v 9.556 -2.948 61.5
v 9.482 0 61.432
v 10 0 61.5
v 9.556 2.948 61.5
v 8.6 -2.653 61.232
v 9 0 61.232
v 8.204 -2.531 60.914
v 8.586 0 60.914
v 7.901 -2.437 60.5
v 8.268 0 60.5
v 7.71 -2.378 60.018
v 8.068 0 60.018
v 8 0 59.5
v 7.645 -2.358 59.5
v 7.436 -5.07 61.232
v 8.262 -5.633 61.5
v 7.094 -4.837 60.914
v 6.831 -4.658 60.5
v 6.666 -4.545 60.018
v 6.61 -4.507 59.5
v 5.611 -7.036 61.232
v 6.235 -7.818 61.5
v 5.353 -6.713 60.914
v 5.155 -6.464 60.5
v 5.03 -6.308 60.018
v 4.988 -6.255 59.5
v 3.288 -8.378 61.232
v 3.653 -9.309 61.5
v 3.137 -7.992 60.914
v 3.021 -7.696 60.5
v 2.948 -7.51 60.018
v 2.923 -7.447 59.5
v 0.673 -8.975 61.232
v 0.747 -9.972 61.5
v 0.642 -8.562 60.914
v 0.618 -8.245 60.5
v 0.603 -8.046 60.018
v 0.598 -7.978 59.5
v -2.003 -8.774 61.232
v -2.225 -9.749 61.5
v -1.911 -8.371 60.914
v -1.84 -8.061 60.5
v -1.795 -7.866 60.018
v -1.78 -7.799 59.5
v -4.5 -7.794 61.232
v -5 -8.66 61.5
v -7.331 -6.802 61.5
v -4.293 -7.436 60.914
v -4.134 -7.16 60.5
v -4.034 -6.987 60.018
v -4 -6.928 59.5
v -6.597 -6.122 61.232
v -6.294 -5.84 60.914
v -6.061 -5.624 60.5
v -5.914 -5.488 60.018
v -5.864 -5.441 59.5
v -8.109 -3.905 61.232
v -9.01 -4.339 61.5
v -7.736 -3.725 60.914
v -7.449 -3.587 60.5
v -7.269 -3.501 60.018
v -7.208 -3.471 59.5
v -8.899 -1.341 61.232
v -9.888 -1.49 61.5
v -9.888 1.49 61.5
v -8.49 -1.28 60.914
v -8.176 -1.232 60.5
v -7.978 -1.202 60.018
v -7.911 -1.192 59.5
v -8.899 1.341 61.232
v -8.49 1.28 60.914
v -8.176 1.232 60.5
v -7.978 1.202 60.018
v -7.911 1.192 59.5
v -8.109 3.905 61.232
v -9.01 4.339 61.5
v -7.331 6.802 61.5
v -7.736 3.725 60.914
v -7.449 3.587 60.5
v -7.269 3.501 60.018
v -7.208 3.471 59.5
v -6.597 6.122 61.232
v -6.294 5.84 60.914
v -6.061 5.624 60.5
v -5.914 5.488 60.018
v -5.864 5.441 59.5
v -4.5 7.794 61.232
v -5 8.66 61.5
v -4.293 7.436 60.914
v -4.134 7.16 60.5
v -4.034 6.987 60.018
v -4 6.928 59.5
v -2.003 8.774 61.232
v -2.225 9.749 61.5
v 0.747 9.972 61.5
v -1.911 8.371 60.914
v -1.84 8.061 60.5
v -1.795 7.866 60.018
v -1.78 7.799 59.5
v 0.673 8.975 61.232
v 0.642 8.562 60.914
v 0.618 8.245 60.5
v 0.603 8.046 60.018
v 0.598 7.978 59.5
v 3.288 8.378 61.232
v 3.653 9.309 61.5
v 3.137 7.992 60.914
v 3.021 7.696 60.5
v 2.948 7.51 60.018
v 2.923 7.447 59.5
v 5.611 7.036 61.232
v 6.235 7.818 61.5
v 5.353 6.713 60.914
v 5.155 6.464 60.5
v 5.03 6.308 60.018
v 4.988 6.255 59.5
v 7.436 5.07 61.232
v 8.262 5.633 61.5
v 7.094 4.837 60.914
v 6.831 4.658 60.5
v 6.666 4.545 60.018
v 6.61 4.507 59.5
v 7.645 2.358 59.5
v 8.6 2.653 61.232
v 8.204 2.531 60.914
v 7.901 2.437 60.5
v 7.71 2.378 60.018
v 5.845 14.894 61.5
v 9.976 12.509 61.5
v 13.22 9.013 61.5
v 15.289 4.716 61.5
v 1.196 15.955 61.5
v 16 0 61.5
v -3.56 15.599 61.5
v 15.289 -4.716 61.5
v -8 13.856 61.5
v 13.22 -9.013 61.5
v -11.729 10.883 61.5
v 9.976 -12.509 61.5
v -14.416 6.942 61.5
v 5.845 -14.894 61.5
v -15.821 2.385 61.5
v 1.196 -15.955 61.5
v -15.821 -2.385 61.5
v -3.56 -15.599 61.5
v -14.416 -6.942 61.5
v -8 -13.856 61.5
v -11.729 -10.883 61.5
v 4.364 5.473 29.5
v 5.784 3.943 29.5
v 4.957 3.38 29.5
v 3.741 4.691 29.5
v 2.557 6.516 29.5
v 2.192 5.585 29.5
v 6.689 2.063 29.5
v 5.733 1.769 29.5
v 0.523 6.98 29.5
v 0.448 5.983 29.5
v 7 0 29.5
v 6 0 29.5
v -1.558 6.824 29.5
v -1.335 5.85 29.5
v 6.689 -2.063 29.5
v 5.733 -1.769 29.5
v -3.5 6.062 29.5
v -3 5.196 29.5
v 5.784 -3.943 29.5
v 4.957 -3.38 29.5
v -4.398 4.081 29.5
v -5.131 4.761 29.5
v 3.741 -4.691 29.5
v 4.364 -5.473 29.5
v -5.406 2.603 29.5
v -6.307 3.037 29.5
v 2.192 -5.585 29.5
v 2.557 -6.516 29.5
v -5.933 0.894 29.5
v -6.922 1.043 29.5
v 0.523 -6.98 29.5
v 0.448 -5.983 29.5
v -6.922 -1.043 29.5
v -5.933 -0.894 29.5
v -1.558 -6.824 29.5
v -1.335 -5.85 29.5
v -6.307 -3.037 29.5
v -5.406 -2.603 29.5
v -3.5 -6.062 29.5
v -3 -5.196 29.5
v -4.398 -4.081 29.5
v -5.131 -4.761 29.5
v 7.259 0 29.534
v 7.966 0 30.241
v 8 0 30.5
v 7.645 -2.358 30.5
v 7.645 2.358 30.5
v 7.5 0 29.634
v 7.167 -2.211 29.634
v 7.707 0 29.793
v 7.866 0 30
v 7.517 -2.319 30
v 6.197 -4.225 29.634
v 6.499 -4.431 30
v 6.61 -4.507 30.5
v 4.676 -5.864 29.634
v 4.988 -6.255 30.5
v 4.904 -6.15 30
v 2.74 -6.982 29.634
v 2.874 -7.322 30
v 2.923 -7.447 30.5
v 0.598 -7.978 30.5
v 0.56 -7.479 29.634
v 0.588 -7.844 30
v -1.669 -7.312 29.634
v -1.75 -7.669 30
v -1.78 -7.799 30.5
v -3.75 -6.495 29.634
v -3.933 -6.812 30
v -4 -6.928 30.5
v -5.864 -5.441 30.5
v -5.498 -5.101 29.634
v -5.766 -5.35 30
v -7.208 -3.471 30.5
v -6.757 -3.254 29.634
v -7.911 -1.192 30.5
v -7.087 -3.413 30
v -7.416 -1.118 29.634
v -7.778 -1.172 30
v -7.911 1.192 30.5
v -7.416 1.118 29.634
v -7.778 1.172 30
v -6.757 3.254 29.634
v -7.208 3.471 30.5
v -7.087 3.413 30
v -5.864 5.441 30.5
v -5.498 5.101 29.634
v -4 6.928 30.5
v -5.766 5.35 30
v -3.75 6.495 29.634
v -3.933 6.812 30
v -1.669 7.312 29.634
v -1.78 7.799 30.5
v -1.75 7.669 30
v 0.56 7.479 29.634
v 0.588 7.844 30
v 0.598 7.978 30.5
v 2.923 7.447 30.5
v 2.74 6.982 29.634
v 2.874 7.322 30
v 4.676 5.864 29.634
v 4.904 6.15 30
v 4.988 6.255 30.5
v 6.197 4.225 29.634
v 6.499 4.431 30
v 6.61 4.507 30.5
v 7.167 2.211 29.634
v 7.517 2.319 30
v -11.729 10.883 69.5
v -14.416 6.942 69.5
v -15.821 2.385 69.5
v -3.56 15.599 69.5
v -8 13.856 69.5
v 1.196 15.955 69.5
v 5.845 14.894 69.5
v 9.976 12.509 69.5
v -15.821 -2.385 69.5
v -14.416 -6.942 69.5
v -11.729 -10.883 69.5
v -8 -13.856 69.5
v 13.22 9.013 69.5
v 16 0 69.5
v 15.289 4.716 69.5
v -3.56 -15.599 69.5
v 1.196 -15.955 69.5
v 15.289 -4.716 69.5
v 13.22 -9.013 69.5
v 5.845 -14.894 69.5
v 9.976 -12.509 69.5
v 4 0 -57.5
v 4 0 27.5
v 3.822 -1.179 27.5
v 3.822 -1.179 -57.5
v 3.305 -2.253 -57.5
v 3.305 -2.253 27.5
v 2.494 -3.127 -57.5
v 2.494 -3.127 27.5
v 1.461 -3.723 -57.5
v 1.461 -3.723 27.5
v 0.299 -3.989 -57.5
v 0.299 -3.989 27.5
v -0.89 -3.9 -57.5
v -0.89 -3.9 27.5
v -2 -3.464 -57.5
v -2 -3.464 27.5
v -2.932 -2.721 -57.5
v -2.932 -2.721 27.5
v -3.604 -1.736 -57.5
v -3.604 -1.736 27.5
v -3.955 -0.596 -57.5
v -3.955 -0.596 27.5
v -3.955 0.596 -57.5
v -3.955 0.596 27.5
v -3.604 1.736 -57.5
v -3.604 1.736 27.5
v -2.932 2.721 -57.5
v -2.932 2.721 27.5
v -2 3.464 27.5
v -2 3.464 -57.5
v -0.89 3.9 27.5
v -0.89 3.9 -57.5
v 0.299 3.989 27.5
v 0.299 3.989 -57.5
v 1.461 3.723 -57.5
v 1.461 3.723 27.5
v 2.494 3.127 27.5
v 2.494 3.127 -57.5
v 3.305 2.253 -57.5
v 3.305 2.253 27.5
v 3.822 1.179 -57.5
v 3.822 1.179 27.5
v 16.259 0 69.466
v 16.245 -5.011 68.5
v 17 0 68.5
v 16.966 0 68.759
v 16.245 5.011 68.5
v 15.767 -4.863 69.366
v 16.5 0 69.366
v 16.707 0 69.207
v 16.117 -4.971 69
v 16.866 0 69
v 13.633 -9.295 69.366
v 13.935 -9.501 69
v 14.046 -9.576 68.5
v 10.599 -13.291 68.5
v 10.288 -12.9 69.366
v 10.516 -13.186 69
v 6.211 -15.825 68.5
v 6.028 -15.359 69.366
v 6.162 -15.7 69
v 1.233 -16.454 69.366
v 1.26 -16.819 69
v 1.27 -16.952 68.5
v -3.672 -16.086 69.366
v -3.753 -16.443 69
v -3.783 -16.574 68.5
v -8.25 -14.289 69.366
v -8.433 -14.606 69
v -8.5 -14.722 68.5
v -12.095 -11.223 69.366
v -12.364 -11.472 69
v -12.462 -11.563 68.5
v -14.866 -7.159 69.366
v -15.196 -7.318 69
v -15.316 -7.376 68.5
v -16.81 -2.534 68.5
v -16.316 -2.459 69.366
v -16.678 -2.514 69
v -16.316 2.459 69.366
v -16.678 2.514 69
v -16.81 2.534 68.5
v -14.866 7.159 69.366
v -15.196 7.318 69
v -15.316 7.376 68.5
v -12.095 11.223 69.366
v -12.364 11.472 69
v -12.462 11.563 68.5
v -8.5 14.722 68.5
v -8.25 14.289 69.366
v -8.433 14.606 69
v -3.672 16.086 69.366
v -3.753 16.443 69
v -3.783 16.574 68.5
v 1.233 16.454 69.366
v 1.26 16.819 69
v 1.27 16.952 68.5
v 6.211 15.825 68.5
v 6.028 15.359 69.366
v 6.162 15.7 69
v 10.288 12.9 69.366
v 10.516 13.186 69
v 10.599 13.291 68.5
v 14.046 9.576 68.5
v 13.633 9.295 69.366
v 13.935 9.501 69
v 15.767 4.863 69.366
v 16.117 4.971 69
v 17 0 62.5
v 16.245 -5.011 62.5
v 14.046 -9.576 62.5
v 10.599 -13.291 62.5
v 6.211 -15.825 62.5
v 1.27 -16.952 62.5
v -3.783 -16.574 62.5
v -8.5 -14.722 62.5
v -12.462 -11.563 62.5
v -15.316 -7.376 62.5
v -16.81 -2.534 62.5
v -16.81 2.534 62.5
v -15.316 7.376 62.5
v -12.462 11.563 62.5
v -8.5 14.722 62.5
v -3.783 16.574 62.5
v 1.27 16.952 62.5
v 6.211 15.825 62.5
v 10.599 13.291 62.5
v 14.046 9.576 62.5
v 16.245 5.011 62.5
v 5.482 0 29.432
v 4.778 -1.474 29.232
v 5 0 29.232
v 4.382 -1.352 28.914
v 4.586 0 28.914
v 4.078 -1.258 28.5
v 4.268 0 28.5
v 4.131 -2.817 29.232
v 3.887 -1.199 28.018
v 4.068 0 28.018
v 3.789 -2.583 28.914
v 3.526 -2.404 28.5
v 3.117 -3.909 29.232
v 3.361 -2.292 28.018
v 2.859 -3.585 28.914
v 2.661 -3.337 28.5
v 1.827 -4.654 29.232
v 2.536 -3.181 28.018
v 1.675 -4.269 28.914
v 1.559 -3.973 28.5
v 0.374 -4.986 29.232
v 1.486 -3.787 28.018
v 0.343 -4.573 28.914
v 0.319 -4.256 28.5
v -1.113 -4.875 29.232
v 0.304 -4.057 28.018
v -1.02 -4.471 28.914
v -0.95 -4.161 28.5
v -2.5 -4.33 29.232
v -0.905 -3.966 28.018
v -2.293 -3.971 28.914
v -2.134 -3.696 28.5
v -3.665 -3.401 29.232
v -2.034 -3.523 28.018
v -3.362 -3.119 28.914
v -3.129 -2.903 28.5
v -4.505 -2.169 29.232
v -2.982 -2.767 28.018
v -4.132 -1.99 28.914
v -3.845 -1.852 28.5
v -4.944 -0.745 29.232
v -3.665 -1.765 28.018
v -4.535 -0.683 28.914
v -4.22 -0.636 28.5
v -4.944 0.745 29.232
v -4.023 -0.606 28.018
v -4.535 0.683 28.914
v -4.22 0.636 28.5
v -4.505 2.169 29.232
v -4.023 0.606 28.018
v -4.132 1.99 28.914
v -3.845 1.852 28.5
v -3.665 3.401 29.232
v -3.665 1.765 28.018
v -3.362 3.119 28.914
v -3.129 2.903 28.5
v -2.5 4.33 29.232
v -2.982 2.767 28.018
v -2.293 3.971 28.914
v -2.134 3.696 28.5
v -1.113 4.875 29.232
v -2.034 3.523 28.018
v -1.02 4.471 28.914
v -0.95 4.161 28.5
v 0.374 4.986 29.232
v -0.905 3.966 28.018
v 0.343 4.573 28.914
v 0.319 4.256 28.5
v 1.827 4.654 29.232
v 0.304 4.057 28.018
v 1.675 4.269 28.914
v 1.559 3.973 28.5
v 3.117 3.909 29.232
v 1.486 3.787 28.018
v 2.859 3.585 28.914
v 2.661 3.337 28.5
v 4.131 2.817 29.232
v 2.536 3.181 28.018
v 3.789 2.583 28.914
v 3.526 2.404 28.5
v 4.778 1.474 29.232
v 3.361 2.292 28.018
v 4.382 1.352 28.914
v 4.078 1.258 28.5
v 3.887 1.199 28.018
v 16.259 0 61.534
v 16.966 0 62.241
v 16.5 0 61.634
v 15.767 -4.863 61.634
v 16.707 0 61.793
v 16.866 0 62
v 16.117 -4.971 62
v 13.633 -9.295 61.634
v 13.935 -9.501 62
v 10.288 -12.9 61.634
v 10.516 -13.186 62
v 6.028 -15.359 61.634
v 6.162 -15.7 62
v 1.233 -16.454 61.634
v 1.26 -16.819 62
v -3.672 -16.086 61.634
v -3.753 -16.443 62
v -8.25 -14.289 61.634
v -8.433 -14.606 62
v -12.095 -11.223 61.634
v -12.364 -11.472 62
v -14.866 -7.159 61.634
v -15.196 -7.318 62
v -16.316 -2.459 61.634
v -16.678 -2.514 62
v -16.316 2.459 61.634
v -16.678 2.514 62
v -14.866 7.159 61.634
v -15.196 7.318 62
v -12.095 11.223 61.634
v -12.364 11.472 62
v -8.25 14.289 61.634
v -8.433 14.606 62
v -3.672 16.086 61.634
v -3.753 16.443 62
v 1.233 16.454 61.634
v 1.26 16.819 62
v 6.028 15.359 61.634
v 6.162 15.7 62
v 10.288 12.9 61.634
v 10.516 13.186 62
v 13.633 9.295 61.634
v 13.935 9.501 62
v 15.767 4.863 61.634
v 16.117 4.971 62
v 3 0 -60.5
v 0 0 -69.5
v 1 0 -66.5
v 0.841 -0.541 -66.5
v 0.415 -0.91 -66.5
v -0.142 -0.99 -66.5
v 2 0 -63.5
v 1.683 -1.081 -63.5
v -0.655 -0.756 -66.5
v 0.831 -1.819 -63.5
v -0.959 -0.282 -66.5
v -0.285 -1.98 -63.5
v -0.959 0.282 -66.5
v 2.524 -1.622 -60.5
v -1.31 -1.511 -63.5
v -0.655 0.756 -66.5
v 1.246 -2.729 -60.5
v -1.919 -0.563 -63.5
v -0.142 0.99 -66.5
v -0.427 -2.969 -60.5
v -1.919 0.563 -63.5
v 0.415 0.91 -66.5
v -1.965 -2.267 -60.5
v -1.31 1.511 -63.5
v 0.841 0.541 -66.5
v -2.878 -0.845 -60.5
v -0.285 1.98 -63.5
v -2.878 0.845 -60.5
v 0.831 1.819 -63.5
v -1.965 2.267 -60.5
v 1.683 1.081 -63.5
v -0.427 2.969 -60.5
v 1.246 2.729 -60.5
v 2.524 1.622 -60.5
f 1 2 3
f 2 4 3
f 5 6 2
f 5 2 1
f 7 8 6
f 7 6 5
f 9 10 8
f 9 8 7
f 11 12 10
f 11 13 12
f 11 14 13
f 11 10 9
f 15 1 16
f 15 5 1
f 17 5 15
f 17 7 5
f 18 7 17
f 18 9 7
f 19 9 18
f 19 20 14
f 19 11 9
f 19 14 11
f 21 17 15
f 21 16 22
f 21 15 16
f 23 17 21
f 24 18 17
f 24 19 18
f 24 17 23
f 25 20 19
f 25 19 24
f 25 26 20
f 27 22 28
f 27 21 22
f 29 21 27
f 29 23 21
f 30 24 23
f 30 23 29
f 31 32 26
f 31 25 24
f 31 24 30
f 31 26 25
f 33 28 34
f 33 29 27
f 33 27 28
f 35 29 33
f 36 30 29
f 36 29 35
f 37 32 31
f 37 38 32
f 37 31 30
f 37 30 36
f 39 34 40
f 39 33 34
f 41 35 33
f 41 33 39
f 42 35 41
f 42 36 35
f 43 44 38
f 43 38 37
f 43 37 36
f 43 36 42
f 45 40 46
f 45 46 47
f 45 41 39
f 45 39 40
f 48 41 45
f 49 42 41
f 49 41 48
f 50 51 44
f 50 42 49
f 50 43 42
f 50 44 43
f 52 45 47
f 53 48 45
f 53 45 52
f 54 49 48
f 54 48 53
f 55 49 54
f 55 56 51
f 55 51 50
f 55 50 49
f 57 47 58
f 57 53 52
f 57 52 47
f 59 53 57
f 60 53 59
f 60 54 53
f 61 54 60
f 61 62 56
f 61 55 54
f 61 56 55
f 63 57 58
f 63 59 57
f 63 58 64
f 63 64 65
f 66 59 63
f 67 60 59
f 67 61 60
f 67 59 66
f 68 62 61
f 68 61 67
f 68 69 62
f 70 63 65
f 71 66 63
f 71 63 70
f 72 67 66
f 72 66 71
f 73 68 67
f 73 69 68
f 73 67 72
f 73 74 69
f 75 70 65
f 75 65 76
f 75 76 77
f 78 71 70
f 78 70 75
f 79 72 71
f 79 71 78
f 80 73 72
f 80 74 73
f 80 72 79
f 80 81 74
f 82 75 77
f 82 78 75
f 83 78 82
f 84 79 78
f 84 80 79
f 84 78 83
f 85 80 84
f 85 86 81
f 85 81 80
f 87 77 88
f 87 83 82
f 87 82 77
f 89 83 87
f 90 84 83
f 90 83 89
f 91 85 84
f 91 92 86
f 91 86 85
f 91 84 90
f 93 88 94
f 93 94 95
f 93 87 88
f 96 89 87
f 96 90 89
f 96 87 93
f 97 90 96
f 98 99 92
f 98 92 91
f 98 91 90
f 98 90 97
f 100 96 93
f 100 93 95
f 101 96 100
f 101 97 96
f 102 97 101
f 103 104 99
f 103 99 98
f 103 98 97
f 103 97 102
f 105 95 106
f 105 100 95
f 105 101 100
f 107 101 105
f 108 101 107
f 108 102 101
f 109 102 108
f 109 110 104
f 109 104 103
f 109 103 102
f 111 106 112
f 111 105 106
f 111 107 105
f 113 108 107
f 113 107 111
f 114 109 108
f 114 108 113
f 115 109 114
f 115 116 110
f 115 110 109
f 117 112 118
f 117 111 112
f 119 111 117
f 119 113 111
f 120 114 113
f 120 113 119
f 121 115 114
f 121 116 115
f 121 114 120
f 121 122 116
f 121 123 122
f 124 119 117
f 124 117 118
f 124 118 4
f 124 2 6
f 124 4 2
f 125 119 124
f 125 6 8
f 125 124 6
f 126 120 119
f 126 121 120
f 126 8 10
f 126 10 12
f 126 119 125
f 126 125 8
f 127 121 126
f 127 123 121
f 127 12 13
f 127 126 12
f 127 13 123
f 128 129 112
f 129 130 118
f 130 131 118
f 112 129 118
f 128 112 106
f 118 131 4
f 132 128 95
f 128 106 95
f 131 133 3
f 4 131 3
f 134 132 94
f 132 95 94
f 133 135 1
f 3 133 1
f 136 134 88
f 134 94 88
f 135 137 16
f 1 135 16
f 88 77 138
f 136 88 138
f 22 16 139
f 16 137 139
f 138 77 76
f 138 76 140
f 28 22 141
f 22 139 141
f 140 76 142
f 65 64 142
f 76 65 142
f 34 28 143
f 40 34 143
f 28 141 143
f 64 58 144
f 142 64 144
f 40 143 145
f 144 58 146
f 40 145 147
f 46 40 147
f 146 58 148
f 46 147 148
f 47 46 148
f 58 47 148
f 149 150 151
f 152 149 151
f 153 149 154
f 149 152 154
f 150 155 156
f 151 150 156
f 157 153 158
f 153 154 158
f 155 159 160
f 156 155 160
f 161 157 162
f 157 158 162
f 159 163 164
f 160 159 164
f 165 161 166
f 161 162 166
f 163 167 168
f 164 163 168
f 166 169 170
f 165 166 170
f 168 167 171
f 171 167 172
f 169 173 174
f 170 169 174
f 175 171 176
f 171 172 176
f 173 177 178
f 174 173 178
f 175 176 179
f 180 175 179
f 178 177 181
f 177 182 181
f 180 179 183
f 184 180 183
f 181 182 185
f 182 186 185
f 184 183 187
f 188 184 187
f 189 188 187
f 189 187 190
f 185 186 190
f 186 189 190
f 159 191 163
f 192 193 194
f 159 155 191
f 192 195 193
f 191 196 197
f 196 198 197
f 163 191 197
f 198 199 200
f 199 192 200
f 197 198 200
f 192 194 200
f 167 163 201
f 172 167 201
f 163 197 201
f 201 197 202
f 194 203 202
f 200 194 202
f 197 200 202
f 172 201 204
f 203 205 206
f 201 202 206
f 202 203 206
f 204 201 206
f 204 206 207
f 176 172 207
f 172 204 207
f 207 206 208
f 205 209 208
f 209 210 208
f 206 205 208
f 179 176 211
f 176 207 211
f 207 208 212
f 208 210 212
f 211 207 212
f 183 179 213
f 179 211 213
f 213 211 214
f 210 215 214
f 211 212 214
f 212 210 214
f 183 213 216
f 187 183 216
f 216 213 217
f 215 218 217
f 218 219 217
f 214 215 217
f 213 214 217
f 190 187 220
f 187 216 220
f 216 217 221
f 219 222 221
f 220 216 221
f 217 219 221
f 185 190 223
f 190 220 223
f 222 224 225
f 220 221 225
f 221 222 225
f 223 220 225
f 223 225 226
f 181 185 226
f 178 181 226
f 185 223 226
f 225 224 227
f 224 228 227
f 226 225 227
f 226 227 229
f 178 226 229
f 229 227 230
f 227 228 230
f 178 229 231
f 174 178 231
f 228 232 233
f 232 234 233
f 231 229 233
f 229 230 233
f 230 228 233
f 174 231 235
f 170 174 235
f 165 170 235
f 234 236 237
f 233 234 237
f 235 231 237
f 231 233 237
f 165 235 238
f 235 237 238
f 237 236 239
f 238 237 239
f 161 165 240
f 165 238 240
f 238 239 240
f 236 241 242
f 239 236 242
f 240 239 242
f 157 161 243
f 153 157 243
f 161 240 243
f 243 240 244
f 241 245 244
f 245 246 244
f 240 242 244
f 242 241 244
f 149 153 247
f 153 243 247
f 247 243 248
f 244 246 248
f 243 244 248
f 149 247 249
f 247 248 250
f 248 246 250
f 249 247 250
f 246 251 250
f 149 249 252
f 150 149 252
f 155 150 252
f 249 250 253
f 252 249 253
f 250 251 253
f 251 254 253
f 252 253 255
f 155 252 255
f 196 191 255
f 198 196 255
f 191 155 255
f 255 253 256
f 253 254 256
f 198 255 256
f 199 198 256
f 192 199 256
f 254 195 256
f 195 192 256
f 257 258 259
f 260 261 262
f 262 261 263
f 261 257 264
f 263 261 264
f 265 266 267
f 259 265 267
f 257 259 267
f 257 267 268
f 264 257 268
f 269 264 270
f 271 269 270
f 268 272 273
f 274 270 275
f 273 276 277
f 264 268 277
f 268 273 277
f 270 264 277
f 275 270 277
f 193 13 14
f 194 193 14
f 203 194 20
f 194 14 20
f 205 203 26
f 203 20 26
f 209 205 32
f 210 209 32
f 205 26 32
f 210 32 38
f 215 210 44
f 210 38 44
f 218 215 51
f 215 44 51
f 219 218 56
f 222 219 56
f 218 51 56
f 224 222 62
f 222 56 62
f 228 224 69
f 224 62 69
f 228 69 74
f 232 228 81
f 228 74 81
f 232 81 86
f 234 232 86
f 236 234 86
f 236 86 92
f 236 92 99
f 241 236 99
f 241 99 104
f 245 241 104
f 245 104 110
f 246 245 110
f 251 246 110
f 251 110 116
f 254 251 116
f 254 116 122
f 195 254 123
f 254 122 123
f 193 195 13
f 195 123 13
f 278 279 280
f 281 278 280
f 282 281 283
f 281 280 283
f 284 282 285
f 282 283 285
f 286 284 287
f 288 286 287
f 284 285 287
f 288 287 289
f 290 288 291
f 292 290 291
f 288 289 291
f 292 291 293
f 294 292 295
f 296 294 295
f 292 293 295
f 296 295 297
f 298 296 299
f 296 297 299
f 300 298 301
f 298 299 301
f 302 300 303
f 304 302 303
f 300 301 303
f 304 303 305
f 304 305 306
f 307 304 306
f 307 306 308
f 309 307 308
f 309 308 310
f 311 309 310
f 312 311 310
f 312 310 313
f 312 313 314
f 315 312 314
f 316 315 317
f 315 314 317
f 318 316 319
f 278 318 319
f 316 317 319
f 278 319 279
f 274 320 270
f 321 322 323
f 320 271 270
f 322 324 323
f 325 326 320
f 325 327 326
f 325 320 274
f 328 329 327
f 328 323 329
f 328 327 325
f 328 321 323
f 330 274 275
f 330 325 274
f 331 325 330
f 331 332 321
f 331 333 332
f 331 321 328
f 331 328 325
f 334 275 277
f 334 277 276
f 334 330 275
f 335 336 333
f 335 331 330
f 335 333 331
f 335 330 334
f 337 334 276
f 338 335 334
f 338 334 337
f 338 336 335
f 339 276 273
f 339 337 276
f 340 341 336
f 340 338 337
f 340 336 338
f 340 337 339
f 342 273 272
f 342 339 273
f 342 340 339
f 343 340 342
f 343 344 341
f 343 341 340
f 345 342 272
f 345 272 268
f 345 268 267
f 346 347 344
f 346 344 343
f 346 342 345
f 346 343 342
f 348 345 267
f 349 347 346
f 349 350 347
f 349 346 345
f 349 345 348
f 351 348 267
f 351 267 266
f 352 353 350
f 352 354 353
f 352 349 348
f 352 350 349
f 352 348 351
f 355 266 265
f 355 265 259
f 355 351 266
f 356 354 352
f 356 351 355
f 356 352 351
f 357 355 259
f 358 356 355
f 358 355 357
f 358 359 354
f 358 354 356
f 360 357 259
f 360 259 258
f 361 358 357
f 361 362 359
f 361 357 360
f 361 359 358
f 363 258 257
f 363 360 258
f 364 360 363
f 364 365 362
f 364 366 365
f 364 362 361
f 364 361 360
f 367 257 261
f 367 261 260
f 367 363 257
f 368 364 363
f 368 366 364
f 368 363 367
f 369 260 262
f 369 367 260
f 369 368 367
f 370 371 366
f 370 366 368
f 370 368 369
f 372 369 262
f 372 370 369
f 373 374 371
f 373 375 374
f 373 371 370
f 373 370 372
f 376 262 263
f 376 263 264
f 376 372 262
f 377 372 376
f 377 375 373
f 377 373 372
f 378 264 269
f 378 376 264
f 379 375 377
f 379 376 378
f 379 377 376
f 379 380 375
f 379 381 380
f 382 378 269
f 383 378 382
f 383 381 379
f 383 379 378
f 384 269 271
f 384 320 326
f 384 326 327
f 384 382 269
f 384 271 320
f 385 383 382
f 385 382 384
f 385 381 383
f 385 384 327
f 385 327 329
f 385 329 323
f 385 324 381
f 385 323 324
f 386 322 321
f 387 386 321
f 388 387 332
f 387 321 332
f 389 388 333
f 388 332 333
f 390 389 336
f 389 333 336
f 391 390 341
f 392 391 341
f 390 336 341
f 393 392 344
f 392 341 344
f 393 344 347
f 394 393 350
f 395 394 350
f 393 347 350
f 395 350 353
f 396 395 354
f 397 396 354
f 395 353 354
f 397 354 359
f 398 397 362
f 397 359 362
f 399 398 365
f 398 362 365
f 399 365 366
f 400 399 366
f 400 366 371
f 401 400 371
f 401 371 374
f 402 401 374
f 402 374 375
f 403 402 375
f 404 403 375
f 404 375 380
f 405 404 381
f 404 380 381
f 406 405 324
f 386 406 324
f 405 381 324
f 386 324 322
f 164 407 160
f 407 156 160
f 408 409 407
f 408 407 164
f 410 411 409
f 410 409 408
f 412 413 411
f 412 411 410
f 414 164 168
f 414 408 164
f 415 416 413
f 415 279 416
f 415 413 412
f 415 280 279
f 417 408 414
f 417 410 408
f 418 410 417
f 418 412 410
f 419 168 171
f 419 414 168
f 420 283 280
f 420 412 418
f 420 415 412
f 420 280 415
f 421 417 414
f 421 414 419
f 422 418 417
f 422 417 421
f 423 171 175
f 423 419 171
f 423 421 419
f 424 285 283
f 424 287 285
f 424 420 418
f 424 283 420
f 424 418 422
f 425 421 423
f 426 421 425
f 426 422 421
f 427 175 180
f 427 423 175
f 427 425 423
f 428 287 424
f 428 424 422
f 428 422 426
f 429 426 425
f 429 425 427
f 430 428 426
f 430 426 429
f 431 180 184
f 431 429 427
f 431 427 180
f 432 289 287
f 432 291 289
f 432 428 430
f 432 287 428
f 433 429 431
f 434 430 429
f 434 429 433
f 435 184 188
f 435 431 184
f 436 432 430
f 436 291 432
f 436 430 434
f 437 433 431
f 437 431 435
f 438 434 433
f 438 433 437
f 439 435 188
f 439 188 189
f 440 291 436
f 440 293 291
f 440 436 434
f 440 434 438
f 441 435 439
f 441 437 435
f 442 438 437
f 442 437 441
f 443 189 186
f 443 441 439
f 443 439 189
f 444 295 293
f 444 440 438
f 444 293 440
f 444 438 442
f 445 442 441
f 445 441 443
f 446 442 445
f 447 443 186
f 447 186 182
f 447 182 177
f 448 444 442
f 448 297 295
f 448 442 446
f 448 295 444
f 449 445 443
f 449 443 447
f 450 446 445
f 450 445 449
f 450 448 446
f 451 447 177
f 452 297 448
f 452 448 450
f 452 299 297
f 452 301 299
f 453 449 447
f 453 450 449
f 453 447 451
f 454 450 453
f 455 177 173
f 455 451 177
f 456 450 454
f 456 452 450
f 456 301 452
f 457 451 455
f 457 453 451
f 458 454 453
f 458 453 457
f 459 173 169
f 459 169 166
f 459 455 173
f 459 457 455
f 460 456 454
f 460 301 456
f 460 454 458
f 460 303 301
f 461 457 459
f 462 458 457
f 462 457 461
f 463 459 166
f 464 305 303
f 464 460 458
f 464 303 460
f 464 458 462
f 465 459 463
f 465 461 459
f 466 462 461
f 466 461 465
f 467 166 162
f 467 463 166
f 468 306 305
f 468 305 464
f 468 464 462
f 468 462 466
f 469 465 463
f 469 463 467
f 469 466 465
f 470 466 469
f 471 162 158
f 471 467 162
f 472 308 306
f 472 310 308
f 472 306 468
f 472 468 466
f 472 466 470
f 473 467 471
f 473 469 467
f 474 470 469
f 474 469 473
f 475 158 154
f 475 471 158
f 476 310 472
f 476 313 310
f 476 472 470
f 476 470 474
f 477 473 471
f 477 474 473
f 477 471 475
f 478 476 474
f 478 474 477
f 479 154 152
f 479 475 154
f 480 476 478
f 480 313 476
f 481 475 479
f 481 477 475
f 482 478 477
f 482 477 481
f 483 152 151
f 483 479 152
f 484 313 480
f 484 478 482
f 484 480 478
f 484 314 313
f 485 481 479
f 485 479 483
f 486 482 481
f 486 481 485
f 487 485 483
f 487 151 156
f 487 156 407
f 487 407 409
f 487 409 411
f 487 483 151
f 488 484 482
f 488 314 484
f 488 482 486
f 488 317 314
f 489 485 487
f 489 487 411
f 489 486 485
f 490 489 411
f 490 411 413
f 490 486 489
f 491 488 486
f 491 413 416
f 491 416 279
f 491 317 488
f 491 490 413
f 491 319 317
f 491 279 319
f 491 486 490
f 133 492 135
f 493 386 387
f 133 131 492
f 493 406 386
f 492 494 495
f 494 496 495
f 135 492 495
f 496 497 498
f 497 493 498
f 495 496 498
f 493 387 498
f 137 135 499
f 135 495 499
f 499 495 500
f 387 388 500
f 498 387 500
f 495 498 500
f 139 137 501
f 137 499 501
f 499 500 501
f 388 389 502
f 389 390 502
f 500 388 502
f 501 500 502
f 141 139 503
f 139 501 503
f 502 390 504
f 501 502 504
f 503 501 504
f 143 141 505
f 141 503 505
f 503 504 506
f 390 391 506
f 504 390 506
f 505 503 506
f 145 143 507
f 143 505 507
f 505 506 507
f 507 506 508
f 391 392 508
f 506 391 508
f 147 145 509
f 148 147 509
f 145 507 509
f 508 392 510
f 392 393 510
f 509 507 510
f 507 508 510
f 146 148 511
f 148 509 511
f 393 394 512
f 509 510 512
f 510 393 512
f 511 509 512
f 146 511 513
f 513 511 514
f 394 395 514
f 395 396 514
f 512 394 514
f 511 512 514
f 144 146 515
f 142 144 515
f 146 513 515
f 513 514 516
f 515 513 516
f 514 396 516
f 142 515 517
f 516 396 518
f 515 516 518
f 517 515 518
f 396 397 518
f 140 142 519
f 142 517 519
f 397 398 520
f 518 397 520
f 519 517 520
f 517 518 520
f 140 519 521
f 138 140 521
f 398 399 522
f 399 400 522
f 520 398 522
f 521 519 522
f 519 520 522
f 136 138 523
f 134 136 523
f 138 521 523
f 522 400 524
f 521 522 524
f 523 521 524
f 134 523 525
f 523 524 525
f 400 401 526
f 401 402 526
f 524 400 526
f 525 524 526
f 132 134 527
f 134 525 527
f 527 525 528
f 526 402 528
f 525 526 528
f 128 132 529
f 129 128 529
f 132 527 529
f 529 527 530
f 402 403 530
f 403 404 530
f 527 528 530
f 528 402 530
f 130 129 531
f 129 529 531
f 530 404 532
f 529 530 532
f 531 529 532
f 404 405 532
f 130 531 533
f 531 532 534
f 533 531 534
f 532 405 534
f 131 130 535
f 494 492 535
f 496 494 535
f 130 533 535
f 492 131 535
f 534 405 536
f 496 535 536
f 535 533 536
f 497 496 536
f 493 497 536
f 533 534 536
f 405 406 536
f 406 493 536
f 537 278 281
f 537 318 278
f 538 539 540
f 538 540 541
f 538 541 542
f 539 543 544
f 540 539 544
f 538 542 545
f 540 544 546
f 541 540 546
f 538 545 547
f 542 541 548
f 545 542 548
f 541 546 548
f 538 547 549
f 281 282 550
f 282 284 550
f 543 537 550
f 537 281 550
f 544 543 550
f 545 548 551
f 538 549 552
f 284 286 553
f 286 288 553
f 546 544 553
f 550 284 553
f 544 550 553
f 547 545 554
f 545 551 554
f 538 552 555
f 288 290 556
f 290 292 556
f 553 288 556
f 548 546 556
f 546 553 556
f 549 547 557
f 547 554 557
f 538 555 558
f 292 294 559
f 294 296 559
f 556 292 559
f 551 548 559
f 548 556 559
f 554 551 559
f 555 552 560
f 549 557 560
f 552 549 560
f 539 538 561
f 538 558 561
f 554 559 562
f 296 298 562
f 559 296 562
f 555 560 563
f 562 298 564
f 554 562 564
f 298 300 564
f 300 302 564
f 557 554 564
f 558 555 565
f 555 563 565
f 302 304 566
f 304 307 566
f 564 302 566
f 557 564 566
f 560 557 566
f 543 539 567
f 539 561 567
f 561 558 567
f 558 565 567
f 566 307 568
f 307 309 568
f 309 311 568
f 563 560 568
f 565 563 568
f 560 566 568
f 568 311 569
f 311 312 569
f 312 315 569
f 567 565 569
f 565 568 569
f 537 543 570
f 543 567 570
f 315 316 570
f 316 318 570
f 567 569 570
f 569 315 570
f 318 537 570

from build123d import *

# Parameters (mm, degrees)
F2_R = 1
F3_R = 2


with BuildPart() as f1:
    # F0 (on Front) → F1 (revolve)
    with BuildSketch(Plane.XZ):
        Polygon((17, 69.5), (0, 69.5), (0, -69.5), (4, -57.5), (4, 29.5), (8, 29.5), (8, 39.5), (8, 61.5), (17, 61.5), align=None)
    revolve(axis=Axis((0, 0, 0), (0, 0, -1)))

    # F2
    f2_edges = [f1.edges().sort_by_distance(p)[0] for p in [
        (-17, 0, 69.5),
        (-17, 0, 61.5),
        (-8, 0, 29.5),
    ]]
    fillet(f2_edges, radius=F2_R)

    # F3
    f3_edges = [f1.edges().sort_by_distance(p)[0] for p in [
        (-8, 0, 61.5),
        (-4, 0, 29.5),
    ]]
    fillet(f3_edges, radius=F3_R)


solid = f1.part
